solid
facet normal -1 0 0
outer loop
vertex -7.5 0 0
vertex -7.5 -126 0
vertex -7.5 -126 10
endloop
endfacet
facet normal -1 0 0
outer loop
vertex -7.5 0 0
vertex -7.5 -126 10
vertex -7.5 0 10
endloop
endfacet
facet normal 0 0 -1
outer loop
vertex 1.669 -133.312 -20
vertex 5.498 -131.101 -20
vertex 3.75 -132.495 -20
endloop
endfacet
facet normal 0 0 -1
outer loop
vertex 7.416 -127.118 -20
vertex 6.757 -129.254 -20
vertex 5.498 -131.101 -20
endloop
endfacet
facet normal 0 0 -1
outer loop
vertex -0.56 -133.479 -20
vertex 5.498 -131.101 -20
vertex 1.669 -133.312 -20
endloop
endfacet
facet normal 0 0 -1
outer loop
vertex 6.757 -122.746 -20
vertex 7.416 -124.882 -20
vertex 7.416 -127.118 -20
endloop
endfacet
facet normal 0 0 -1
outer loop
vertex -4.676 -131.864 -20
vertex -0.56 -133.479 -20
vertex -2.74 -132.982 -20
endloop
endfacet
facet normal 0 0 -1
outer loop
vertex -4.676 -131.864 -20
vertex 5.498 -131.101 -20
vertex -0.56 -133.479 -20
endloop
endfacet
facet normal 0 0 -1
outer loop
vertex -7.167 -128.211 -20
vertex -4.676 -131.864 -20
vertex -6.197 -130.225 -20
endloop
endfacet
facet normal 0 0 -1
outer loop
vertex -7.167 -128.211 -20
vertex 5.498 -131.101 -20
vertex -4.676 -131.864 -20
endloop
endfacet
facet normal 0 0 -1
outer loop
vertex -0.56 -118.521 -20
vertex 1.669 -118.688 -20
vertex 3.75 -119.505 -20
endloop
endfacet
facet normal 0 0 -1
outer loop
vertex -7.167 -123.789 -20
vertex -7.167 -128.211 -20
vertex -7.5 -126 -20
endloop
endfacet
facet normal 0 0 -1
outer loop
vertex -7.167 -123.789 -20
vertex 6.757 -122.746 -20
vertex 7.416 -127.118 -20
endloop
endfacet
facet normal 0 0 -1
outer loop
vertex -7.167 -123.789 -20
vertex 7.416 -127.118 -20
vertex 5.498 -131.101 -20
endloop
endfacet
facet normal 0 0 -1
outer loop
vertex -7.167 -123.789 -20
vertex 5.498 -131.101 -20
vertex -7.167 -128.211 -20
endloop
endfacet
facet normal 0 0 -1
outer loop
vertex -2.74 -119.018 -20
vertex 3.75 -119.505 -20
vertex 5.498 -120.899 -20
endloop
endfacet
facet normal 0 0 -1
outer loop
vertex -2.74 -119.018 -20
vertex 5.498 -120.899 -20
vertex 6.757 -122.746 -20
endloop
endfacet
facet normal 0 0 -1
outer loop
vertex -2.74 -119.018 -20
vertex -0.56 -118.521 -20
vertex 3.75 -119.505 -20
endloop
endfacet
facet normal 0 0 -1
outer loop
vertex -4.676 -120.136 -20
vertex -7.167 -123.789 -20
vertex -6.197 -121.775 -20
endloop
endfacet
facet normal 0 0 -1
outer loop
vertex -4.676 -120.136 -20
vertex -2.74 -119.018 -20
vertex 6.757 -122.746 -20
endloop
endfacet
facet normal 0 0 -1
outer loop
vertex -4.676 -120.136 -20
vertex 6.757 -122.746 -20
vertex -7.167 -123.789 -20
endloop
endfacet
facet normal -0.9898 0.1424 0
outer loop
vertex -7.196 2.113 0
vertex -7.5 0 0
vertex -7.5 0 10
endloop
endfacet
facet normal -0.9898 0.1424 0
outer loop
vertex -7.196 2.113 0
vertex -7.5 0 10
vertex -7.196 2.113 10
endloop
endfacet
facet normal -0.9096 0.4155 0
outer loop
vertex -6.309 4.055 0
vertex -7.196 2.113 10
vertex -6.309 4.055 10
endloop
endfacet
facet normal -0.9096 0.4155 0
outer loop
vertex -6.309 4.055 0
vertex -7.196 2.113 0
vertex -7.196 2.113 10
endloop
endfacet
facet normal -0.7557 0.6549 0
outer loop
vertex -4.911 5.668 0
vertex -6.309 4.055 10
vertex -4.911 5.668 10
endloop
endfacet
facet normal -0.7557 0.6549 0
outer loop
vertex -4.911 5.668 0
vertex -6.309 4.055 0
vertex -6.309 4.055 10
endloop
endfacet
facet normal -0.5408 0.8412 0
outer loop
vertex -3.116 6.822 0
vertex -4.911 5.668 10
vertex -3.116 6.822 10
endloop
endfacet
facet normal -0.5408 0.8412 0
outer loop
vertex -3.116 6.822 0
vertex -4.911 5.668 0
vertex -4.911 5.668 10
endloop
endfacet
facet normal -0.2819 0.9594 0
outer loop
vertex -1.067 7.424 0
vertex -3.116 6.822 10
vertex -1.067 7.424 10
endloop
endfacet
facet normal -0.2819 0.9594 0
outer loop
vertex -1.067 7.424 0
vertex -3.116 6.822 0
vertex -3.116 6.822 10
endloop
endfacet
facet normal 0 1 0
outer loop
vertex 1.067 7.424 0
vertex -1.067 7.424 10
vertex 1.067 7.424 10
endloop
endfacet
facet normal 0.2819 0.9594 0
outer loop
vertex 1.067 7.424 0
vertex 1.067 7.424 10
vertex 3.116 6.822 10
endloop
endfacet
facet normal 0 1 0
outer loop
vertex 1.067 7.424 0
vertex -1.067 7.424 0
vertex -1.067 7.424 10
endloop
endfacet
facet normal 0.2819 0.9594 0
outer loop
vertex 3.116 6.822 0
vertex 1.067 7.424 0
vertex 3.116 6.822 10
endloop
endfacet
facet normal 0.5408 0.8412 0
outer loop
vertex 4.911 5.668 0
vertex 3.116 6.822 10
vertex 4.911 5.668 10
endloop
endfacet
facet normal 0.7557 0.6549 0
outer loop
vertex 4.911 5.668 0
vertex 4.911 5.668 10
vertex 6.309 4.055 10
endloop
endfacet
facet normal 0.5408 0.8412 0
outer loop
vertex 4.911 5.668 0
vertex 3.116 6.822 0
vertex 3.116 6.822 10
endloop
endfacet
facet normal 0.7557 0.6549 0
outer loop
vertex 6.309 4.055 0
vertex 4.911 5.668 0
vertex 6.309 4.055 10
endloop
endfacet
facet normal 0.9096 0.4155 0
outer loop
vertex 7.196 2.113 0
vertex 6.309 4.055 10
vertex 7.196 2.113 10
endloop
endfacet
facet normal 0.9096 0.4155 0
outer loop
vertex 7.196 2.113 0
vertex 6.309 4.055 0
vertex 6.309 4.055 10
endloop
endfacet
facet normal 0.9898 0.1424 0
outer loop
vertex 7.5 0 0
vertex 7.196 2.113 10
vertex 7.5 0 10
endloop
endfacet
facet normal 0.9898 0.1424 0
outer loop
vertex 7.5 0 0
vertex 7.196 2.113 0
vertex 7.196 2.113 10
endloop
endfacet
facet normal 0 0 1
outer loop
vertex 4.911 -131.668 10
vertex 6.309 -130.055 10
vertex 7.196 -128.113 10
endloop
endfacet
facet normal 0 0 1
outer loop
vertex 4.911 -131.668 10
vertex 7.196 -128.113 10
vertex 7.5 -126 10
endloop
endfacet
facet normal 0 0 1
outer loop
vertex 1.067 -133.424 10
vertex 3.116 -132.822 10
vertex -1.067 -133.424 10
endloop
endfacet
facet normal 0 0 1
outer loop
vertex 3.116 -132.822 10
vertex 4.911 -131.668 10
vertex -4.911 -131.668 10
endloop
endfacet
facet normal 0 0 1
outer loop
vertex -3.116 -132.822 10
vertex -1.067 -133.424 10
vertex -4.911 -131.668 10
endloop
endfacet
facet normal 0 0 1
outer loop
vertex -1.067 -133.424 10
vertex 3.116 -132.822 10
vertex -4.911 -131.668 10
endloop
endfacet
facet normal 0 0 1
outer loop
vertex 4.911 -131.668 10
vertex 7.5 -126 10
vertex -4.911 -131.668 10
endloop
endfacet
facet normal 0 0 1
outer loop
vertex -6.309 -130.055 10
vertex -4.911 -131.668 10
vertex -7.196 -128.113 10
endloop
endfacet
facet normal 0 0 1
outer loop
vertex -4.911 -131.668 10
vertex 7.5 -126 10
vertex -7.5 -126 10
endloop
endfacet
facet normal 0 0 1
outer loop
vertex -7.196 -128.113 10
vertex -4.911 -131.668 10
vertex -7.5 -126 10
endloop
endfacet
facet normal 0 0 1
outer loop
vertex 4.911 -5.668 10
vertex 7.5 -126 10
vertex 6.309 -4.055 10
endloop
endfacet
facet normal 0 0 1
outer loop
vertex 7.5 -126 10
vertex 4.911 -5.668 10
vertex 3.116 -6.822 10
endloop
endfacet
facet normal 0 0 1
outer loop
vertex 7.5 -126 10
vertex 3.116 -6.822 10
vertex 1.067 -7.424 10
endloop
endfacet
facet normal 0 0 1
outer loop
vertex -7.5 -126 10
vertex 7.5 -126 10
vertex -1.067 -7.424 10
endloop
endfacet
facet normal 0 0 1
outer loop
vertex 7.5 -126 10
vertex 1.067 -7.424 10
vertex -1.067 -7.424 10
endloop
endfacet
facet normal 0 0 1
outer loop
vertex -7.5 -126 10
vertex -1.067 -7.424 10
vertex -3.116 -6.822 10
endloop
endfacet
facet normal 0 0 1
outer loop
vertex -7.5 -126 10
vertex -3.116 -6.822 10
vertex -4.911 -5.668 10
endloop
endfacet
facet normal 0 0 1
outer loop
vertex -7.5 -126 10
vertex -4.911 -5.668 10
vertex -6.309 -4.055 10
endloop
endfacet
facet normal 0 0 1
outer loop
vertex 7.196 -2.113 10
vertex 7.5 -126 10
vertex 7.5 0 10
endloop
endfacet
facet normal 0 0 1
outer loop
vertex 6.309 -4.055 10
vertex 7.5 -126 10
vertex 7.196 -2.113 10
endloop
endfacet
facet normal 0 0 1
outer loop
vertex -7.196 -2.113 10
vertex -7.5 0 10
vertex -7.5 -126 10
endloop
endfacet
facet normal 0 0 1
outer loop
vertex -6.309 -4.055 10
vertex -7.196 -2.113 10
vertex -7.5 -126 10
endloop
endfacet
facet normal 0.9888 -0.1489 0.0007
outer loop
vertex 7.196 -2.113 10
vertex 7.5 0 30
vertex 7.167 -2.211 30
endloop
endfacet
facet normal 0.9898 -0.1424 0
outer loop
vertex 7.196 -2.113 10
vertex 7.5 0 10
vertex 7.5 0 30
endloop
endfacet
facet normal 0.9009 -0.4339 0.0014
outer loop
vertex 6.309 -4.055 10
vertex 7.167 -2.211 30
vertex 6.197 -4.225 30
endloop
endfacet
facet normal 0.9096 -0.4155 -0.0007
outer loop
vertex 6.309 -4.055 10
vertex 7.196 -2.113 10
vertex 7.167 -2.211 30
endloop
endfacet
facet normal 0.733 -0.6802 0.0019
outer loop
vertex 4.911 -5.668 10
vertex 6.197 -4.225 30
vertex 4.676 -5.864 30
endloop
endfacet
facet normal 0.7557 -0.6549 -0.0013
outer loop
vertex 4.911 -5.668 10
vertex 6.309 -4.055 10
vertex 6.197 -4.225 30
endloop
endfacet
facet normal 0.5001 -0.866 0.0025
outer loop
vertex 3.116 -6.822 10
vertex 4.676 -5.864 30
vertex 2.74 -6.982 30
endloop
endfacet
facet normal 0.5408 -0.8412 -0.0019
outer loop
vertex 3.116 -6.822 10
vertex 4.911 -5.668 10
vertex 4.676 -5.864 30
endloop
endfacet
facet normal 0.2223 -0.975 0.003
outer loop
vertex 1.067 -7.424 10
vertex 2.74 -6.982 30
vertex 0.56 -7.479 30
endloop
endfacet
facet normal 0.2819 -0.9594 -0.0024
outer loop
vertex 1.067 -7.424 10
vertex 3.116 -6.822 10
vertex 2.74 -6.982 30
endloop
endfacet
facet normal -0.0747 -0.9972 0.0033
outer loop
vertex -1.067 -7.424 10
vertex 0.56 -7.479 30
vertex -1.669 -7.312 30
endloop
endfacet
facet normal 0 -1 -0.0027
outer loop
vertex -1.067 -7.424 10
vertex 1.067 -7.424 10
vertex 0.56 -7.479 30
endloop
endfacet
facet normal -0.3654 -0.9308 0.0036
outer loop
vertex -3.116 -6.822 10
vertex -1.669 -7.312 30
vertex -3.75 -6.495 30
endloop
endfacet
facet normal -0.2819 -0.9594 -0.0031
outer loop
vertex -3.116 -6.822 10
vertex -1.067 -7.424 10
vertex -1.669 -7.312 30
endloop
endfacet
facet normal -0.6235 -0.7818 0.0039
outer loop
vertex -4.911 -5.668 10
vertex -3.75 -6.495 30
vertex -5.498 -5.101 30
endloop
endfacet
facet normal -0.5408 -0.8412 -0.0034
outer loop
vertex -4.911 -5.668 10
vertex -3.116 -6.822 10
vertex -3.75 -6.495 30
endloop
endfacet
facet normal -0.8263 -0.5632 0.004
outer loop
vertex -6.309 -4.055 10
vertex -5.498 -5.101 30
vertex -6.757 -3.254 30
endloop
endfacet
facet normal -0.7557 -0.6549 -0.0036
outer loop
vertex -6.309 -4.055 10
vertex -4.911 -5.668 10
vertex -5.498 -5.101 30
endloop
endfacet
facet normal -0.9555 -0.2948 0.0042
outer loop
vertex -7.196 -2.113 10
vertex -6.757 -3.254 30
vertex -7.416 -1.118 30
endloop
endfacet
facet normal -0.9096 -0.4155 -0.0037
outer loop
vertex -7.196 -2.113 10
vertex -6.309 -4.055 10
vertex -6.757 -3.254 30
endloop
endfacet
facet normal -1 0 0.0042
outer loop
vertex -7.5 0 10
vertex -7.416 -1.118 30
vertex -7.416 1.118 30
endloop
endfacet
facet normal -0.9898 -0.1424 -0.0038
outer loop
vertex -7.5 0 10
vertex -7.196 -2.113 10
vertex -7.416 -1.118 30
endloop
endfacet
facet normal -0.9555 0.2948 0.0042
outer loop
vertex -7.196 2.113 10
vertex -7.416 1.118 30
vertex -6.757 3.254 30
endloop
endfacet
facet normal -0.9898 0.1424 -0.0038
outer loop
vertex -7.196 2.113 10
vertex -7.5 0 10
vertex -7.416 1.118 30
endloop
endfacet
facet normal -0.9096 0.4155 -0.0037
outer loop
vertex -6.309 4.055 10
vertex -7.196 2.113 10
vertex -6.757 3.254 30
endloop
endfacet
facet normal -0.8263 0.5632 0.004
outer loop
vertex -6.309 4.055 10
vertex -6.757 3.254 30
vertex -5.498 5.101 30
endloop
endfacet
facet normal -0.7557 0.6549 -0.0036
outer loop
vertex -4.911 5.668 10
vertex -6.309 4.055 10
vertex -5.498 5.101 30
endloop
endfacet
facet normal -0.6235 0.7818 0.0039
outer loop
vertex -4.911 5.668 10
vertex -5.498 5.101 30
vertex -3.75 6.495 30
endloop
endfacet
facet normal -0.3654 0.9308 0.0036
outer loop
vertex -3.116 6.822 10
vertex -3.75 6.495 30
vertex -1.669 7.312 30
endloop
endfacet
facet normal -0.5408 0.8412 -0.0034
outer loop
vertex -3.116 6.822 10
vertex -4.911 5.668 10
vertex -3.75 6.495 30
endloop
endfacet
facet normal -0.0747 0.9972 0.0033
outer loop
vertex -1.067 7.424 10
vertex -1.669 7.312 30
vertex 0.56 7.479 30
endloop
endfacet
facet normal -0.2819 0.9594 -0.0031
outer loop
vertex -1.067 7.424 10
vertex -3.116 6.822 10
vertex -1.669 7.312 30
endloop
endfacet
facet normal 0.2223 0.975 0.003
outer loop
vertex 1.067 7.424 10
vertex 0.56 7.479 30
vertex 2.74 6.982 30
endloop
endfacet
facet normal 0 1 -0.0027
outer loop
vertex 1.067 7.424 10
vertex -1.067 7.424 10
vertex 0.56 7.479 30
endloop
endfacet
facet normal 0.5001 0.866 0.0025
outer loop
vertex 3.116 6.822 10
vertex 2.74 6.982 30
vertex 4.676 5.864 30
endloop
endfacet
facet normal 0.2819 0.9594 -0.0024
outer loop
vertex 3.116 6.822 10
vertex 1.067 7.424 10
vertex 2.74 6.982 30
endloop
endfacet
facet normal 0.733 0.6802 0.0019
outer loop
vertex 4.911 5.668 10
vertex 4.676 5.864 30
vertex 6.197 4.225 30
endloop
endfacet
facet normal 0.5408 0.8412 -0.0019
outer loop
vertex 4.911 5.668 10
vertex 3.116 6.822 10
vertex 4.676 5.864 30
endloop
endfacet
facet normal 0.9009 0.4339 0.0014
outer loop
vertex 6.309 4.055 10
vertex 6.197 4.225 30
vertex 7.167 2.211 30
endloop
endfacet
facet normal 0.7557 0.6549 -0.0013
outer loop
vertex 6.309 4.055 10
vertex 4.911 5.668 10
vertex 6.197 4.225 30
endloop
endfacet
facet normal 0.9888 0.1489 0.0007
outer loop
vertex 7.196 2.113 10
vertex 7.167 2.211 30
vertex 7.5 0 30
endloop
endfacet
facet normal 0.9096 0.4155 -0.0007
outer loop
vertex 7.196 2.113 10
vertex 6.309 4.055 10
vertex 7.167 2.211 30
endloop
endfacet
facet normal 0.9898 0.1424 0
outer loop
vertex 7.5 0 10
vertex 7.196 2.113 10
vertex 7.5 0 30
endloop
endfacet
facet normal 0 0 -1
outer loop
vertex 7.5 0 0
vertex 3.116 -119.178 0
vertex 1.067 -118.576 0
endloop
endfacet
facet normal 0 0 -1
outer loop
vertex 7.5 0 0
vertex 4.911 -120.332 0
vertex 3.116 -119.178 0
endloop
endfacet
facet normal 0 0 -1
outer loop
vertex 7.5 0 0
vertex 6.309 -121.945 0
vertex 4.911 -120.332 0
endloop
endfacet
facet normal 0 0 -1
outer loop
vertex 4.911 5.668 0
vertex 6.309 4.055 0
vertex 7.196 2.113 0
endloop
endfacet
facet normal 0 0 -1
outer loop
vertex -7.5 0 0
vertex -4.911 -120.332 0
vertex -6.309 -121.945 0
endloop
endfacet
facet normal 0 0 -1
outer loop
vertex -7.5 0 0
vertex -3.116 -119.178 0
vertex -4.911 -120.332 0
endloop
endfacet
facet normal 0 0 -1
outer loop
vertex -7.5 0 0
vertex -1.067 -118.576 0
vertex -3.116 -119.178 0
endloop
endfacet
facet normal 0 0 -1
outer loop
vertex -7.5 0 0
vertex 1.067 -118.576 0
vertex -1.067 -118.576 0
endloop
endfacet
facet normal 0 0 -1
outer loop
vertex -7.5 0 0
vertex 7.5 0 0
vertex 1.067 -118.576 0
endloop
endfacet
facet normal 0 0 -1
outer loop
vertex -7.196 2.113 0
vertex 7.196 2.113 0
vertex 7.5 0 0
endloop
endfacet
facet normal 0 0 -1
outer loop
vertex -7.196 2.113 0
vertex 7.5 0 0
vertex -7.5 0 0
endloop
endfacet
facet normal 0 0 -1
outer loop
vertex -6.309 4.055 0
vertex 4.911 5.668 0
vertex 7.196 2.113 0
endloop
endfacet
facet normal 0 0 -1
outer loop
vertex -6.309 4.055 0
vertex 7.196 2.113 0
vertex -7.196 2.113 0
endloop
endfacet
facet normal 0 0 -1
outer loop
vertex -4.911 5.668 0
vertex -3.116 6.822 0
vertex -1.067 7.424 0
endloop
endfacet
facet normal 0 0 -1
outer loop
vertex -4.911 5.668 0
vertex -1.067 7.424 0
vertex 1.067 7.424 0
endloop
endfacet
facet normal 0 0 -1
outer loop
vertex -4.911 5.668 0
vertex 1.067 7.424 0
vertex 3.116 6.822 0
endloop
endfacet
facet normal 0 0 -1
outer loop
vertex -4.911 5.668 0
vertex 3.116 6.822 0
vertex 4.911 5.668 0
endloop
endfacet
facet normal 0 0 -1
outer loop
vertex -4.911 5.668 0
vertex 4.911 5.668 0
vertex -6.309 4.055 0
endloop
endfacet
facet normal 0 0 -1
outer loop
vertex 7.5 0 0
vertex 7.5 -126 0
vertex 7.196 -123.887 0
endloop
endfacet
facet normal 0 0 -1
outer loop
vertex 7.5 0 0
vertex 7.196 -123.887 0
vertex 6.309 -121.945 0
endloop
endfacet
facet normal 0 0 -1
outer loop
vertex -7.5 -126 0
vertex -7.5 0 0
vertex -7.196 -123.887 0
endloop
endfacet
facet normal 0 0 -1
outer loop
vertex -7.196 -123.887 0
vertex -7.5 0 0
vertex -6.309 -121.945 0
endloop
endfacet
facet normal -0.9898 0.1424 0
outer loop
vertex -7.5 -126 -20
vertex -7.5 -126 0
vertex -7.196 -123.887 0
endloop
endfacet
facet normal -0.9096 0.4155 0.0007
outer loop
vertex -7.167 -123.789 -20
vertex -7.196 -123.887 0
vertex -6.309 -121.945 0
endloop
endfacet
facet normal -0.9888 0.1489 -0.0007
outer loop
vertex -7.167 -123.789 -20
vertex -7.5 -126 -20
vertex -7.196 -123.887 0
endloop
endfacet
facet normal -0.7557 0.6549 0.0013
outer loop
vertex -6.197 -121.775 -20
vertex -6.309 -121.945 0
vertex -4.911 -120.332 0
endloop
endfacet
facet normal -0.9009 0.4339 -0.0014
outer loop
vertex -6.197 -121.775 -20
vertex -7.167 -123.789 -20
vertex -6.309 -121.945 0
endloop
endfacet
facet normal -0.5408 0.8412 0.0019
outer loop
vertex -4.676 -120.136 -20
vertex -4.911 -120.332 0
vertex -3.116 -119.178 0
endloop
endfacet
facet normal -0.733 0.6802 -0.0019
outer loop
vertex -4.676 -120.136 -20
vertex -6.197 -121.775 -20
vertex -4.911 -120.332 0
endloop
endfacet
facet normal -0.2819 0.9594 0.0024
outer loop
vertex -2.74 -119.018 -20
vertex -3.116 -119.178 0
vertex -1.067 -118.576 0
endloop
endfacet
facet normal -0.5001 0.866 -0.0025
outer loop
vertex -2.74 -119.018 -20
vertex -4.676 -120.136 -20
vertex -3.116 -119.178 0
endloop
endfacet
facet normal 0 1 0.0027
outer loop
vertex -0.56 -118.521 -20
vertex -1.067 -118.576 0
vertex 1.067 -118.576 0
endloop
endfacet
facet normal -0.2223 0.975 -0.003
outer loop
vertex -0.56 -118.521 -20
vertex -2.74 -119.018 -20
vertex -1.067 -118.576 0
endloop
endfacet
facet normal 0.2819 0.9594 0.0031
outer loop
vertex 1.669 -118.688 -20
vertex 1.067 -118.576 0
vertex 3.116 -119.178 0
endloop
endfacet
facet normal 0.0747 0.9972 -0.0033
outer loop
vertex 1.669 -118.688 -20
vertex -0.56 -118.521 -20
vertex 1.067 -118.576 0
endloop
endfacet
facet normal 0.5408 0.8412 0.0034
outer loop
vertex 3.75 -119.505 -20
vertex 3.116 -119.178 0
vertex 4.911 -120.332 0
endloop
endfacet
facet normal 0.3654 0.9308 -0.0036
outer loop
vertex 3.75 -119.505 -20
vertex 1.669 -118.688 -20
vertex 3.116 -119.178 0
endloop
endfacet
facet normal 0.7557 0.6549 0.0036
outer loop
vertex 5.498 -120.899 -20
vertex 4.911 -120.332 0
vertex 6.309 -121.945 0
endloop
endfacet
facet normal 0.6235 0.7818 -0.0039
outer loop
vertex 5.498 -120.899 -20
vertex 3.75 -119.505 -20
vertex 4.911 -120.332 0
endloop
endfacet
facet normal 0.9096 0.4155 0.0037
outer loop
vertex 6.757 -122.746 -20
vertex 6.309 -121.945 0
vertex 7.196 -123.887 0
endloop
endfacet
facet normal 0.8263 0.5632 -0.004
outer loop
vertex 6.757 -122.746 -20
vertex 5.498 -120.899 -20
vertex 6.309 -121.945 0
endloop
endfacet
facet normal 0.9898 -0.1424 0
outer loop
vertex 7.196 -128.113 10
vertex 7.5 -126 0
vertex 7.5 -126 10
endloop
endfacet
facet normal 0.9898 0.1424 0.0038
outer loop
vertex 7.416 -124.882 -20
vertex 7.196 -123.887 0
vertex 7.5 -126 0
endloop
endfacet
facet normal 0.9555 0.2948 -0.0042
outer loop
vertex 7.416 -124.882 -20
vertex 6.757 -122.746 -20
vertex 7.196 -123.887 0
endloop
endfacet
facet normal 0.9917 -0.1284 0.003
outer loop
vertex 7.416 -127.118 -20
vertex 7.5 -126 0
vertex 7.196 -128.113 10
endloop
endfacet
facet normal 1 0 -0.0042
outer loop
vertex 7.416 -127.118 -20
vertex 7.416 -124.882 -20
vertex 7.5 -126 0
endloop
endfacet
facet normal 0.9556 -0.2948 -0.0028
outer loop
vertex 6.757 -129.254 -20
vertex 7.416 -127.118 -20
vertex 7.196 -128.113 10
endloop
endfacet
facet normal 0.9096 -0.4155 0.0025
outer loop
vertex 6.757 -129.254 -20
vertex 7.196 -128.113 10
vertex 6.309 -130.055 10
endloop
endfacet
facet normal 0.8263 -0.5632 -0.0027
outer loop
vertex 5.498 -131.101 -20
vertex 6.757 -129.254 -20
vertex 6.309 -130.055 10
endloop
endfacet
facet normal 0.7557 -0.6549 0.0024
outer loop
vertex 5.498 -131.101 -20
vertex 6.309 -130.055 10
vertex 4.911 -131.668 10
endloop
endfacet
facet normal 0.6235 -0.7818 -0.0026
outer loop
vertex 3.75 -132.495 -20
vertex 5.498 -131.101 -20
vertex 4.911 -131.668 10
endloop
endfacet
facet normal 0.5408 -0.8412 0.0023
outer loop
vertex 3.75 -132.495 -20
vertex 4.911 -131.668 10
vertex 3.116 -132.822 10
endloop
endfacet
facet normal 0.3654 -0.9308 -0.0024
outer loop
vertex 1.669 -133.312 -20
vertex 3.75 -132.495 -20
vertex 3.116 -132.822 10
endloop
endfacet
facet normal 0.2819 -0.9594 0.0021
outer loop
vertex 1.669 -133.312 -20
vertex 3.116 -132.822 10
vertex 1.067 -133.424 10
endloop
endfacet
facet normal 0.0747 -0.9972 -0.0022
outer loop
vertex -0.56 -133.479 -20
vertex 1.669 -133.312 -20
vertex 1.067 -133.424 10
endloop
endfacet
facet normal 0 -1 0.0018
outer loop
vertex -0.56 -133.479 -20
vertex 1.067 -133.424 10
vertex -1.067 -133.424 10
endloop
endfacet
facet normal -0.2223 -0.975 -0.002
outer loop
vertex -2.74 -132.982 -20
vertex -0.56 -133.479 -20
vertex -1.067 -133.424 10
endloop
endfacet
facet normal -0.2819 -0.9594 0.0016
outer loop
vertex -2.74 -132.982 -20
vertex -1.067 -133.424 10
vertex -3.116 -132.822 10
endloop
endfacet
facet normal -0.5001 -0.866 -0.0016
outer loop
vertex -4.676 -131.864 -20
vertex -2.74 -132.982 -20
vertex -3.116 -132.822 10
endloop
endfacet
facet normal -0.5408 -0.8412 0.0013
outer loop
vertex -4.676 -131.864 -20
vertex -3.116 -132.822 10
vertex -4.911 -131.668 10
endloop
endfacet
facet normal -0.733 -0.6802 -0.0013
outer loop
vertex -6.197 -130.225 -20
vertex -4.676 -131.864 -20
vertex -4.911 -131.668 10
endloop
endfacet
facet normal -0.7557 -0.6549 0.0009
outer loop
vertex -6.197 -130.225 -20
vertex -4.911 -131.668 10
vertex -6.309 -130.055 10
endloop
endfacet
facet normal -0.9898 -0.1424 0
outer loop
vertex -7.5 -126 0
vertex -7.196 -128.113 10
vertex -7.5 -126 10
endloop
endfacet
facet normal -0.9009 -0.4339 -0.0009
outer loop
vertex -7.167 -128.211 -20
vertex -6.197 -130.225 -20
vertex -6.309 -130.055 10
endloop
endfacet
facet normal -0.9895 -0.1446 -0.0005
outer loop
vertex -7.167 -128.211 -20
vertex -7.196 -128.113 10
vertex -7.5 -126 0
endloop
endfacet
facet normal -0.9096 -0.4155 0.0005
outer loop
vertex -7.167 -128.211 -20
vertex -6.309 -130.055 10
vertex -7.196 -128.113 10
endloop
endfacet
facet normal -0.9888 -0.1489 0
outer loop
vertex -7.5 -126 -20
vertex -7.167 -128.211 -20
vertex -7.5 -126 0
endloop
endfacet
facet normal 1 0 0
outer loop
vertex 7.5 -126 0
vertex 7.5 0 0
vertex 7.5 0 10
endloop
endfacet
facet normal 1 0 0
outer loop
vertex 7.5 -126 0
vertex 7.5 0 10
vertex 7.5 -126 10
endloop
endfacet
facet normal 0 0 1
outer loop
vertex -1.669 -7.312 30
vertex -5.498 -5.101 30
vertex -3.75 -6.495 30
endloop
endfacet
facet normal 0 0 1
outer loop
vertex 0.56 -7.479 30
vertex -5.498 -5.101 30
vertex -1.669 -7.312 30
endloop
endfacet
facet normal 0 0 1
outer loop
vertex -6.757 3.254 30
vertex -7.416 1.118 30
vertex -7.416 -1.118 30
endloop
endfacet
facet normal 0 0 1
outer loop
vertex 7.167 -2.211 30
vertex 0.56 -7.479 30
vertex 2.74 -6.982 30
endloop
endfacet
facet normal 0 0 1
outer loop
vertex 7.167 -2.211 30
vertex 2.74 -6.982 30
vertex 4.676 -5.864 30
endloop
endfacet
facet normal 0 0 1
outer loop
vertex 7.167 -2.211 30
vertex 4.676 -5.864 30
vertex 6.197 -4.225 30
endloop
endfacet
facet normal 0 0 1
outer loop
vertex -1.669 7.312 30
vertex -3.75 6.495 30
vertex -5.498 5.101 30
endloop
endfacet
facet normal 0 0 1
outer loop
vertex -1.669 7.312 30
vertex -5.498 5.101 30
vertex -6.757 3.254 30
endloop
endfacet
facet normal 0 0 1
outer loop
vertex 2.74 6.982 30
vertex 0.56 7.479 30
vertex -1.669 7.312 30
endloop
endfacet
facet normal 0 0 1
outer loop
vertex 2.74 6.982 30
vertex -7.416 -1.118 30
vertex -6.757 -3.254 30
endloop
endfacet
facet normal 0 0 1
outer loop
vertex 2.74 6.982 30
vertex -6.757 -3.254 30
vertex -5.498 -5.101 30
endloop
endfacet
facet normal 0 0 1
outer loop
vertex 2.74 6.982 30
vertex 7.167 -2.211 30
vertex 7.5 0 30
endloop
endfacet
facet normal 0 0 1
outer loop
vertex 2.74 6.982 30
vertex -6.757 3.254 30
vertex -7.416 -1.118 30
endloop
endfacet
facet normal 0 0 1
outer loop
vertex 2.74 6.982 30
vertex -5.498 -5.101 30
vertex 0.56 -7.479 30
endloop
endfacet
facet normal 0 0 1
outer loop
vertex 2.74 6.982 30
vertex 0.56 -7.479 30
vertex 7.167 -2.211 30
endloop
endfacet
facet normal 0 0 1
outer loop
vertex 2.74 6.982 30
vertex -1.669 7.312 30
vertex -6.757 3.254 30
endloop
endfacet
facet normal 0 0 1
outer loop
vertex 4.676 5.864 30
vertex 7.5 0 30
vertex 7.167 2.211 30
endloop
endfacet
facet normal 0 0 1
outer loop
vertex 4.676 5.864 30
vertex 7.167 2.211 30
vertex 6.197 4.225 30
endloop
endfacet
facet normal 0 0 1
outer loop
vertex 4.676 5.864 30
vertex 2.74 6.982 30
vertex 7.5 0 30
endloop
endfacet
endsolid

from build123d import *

# Parameters (mm, degrees)
EXTRUDE_1_DEPTH = 10
SKETCH_2_R      = 7.5
EXTRUDE_2_DEPTH = 20
EXTRUDE_START   = 20
SKETCH_3_R      = 7.5
EXTRUDE_3_DEPTH = 20


with BuildPart() as part:
    # 草图1 → 凸台-拉伸1 (new body)
    with BuildSketch(Plane.XY):
        with BuildLine():
            Line((7.5, 0), (7.5, -126))
            ThreePointArc((7.5, -126), (0, -133.5), (-7.5, -126))
            Line((-7.5, -126), (-7.5, 0))
            ThreePointArc((-7.5, 0), (0, 7.5), (7.5, 0))
        make_face()
    extrude(amount=EXTRUDE_1_DEPTH)

    # 草图2 → 凸台-拉伸2 (add)
    with BuildSketch(Plane.XY.offset(10)):
        Circle(SKETCH_2_R)
    extrude(amount=EXTRUDE_2_DEPTH)

    # 草图3 → 凸台-拉伸3 (add)
    with BuildSketch(Plane(origin=(0, 0, 0), x_dir=(-1, 0, 0), z_dir=(0, 0, -1)).offset(EXTRUDE_START)):
        with Locations((0, -126)):
            Circle(SKETCH_3_R)
    extrude(amount=-EXTRUDE_3_DEPTH)


solid = part.part
